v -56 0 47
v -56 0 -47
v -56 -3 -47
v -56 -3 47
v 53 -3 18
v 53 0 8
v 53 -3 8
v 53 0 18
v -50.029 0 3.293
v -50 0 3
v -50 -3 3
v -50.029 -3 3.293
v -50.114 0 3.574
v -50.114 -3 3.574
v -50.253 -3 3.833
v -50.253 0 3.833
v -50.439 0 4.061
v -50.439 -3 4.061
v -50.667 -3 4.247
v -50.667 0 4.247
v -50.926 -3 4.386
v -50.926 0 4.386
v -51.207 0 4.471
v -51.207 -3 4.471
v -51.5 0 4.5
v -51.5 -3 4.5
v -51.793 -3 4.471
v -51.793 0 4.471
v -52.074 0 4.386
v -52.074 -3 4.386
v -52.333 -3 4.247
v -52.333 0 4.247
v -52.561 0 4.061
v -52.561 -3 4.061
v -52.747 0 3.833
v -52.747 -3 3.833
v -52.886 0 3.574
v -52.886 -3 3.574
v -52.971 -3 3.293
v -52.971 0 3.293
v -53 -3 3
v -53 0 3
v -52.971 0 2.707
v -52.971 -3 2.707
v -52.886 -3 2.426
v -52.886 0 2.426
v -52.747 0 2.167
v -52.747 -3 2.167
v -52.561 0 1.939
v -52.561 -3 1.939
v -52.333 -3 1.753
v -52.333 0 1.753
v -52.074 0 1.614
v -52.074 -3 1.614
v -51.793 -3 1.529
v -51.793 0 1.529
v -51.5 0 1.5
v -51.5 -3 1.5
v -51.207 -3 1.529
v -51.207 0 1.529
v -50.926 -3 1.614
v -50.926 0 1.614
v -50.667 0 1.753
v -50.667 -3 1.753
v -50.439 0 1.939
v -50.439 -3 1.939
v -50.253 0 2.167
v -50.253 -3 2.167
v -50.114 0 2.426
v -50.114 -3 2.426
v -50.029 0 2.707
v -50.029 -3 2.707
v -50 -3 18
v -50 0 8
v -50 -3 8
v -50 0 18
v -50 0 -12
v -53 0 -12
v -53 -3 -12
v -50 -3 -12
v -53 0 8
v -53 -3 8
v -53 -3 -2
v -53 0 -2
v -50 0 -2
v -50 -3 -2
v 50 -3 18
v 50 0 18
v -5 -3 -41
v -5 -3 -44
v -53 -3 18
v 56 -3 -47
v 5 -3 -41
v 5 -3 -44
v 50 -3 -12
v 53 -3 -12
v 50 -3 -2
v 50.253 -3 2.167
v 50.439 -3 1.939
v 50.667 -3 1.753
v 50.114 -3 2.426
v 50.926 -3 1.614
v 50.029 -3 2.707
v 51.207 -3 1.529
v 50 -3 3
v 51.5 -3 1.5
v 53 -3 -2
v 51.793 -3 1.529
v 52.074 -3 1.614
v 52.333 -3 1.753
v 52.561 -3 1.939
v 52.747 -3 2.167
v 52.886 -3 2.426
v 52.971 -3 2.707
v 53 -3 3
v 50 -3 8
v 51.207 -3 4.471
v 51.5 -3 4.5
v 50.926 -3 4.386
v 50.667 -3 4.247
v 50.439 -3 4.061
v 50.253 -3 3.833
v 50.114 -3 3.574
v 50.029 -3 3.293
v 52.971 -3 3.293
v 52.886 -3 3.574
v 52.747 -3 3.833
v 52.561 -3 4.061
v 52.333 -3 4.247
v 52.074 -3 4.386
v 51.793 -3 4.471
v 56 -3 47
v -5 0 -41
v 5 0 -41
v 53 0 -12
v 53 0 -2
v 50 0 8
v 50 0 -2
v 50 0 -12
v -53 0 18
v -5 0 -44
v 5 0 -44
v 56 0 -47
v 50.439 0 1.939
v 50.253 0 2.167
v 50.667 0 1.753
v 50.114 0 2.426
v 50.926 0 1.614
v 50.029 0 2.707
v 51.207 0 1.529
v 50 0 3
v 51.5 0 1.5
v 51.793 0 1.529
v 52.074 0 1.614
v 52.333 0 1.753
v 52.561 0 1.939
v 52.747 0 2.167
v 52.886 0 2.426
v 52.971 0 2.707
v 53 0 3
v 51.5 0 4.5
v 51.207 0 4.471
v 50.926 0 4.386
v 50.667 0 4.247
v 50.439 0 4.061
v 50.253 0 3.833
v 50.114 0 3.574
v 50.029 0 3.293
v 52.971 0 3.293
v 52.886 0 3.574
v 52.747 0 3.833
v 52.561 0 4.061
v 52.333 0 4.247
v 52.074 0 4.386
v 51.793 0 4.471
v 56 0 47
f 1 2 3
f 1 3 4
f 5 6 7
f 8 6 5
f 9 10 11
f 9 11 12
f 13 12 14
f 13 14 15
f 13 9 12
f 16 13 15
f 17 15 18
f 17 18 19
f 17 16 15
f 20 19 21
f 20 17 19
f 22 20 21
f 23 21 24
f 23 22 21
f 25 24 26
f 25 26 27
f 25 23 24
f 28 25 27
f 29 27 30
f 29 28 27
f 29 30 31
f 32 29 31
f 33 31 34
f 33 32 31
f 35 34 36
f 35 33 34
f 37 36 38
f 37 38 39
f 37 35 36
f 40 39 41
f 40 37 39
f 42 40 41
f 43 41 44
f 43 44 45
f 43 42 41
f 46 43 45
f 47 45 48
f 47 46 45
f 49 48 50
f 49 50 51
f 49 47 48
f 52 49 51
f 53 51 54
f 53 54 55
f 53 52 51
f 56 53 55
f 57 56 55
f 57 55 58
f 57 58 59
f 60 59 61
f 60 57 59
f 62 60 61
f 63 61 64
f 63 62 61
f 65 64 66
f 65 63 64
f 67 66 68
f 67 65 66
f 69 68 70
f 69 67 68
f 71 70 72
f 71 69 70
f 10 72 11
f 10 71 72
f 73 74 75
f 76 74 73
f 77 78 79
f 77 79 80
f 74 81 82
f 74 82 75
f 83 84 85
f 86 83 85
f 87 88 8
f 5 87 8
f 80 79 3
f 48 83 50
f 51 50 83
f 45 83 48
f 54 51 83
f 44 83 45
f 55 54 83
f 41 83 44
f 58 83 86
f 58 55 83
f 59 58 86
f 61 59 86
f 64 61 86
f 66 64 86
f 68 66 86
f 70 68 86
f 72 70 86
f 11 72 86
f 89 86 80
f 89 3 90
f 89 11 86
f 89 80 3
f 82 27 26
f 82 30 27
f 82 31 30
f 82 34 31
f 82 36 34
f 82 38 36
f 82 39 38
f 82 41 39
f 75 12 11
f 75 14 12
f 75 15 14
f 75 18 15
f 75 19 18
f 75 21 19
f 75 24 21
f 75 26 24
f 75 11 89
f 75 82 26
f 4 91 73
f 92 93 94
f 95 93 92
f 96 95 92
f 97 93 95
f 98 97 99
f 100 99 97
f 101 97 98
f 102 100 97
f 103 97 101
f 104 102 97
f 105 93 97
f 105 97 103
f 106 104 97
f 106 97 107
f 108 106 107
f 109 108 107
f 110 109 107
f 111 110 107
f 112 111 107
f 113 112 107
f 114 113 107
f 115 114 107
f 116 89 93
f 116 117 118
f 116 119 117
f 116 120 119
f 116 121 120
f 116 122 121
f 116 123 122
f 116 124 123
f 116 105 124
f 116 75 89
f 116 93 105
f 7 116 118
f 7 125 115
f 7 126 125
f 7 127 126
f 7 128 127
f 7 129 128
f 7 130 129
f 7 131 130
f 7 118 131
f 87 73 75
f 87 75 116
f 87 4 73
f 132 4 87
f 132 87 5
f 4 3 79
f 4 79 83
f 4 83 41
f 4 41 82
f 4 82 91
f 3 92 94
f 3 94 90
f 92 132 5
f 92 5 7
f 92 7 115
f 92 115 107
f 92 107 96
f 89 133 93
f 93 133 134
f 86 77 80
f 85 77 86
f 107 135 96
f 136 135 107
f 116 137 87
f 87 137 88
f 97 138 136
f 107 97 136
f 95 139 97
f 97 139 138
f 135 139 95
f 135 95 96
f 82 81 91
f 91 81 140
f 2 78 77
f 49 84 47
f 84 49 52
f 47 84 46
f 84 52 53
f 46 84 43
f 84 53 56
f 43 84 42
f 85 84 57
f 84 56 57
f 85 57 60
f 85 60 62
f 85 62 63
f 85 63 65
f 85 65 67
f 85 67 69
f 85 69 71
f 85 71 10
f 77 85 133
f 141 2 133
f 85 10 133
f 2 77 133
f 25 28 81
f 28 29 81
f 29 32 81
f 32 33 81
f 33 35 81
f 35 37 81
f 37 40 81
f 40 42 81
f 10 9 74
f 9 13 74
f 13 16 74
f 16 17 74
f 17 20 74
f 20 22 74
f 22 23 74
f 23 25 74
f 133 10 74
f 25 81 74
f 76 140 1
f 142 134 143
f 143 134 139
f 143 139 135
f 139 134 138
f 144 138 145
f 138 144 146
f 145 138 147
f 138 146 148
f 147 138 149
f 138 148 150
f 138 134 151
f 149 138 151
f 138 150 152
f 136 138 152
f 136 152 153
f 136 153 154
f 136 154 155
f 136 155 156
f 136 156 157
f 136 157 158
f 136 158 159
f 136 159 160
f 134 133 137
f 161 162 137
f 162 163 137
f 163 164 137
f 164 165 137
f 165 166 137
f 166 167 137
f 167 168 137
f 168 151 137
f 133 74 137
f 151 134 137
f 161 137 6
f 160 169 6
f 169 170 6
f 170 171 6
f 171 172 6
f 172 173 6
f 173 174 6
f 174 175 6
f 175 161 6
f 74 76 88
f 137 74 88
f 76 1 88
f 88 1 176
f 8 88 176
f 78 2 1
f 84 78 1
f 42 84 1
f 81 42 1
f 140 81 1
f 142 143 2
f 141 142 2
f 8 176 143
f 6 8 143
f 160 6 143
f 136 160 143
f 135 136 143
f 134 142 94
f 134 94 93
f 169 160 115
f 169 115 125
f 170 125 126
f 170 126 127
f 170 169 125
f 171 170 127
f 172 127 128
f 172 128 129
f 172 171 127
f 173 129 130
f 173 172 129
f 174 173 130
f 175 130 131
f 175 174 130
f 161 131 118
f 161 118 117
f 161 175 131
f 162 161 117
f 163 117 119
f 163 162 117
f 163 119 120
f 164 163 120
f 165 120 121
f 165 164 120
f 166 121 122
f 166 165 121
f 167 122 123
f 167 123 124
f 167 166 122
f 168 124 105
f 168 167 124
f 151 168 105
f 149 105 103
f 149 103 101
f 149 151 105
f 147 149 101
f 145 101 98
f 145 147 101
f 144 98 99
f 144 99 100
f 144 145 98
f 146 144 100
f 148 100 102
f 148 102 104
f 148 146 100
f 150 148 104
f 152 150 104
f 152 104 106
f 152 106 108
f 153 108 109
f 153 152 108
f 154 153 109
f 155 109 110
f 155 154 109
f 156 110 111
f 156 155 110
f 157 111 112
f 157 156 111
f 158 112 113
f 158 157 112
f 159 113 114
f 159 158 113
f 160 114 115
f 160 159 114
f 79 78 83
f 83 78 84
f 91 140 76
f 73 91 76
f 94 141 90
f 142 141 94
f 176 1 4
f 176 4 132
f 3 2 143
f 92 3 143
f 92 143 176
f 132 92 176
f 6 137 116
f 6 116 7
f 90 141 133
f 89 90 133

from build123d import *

# Parameters (mm, degrees)
F0_W     = 112
F0_H     = 94
F0_W_2   = 3
F0_H_2   = 10
F0_W_3   = 10
F0_H_3   = 3
F0_R     = 1.5
F1_DEPTH = 3


with BuildPart() as f1:
    # F0 (on Front) → F1 (new body)
    with BuildSketch(Plane.XZ):
        Rectangle(F0_W, F0_H)
        with Locations((-51.5, -7)):
            Rectangle(F0_W_2, F0_H_2, mode=Mode.SUBTRACT)
        with Locations((0, -42.5)):
            Rectangle(F0_W_3, F0_H_3, mode=Mode.SUBTRACT)
        with Locations((51.5, -7)):
            Rectangle(F0_W_2, F0_H_2, mode=Mode.SUBTRACT)
        with Locations((-51.5, 3)):
            Circle(F0_R, mode=Mode.SUBTRACT)
        with Locations((-51.5, 13)):
            Rectangle(F0_W_2, F0_H_2, mode=Mode.SUBTRACT)
        with Locations((51.5, 3)):
            Circle(F0_R, mode=Mode.SUBTRACT)
        with Locations((51.5, 13)):
            Rectangle(F0_W_2, F0_H_2, mode=Mode.SUBTRACT)
    extrude(amount=F1_DEPTH)


solid = f1.part
